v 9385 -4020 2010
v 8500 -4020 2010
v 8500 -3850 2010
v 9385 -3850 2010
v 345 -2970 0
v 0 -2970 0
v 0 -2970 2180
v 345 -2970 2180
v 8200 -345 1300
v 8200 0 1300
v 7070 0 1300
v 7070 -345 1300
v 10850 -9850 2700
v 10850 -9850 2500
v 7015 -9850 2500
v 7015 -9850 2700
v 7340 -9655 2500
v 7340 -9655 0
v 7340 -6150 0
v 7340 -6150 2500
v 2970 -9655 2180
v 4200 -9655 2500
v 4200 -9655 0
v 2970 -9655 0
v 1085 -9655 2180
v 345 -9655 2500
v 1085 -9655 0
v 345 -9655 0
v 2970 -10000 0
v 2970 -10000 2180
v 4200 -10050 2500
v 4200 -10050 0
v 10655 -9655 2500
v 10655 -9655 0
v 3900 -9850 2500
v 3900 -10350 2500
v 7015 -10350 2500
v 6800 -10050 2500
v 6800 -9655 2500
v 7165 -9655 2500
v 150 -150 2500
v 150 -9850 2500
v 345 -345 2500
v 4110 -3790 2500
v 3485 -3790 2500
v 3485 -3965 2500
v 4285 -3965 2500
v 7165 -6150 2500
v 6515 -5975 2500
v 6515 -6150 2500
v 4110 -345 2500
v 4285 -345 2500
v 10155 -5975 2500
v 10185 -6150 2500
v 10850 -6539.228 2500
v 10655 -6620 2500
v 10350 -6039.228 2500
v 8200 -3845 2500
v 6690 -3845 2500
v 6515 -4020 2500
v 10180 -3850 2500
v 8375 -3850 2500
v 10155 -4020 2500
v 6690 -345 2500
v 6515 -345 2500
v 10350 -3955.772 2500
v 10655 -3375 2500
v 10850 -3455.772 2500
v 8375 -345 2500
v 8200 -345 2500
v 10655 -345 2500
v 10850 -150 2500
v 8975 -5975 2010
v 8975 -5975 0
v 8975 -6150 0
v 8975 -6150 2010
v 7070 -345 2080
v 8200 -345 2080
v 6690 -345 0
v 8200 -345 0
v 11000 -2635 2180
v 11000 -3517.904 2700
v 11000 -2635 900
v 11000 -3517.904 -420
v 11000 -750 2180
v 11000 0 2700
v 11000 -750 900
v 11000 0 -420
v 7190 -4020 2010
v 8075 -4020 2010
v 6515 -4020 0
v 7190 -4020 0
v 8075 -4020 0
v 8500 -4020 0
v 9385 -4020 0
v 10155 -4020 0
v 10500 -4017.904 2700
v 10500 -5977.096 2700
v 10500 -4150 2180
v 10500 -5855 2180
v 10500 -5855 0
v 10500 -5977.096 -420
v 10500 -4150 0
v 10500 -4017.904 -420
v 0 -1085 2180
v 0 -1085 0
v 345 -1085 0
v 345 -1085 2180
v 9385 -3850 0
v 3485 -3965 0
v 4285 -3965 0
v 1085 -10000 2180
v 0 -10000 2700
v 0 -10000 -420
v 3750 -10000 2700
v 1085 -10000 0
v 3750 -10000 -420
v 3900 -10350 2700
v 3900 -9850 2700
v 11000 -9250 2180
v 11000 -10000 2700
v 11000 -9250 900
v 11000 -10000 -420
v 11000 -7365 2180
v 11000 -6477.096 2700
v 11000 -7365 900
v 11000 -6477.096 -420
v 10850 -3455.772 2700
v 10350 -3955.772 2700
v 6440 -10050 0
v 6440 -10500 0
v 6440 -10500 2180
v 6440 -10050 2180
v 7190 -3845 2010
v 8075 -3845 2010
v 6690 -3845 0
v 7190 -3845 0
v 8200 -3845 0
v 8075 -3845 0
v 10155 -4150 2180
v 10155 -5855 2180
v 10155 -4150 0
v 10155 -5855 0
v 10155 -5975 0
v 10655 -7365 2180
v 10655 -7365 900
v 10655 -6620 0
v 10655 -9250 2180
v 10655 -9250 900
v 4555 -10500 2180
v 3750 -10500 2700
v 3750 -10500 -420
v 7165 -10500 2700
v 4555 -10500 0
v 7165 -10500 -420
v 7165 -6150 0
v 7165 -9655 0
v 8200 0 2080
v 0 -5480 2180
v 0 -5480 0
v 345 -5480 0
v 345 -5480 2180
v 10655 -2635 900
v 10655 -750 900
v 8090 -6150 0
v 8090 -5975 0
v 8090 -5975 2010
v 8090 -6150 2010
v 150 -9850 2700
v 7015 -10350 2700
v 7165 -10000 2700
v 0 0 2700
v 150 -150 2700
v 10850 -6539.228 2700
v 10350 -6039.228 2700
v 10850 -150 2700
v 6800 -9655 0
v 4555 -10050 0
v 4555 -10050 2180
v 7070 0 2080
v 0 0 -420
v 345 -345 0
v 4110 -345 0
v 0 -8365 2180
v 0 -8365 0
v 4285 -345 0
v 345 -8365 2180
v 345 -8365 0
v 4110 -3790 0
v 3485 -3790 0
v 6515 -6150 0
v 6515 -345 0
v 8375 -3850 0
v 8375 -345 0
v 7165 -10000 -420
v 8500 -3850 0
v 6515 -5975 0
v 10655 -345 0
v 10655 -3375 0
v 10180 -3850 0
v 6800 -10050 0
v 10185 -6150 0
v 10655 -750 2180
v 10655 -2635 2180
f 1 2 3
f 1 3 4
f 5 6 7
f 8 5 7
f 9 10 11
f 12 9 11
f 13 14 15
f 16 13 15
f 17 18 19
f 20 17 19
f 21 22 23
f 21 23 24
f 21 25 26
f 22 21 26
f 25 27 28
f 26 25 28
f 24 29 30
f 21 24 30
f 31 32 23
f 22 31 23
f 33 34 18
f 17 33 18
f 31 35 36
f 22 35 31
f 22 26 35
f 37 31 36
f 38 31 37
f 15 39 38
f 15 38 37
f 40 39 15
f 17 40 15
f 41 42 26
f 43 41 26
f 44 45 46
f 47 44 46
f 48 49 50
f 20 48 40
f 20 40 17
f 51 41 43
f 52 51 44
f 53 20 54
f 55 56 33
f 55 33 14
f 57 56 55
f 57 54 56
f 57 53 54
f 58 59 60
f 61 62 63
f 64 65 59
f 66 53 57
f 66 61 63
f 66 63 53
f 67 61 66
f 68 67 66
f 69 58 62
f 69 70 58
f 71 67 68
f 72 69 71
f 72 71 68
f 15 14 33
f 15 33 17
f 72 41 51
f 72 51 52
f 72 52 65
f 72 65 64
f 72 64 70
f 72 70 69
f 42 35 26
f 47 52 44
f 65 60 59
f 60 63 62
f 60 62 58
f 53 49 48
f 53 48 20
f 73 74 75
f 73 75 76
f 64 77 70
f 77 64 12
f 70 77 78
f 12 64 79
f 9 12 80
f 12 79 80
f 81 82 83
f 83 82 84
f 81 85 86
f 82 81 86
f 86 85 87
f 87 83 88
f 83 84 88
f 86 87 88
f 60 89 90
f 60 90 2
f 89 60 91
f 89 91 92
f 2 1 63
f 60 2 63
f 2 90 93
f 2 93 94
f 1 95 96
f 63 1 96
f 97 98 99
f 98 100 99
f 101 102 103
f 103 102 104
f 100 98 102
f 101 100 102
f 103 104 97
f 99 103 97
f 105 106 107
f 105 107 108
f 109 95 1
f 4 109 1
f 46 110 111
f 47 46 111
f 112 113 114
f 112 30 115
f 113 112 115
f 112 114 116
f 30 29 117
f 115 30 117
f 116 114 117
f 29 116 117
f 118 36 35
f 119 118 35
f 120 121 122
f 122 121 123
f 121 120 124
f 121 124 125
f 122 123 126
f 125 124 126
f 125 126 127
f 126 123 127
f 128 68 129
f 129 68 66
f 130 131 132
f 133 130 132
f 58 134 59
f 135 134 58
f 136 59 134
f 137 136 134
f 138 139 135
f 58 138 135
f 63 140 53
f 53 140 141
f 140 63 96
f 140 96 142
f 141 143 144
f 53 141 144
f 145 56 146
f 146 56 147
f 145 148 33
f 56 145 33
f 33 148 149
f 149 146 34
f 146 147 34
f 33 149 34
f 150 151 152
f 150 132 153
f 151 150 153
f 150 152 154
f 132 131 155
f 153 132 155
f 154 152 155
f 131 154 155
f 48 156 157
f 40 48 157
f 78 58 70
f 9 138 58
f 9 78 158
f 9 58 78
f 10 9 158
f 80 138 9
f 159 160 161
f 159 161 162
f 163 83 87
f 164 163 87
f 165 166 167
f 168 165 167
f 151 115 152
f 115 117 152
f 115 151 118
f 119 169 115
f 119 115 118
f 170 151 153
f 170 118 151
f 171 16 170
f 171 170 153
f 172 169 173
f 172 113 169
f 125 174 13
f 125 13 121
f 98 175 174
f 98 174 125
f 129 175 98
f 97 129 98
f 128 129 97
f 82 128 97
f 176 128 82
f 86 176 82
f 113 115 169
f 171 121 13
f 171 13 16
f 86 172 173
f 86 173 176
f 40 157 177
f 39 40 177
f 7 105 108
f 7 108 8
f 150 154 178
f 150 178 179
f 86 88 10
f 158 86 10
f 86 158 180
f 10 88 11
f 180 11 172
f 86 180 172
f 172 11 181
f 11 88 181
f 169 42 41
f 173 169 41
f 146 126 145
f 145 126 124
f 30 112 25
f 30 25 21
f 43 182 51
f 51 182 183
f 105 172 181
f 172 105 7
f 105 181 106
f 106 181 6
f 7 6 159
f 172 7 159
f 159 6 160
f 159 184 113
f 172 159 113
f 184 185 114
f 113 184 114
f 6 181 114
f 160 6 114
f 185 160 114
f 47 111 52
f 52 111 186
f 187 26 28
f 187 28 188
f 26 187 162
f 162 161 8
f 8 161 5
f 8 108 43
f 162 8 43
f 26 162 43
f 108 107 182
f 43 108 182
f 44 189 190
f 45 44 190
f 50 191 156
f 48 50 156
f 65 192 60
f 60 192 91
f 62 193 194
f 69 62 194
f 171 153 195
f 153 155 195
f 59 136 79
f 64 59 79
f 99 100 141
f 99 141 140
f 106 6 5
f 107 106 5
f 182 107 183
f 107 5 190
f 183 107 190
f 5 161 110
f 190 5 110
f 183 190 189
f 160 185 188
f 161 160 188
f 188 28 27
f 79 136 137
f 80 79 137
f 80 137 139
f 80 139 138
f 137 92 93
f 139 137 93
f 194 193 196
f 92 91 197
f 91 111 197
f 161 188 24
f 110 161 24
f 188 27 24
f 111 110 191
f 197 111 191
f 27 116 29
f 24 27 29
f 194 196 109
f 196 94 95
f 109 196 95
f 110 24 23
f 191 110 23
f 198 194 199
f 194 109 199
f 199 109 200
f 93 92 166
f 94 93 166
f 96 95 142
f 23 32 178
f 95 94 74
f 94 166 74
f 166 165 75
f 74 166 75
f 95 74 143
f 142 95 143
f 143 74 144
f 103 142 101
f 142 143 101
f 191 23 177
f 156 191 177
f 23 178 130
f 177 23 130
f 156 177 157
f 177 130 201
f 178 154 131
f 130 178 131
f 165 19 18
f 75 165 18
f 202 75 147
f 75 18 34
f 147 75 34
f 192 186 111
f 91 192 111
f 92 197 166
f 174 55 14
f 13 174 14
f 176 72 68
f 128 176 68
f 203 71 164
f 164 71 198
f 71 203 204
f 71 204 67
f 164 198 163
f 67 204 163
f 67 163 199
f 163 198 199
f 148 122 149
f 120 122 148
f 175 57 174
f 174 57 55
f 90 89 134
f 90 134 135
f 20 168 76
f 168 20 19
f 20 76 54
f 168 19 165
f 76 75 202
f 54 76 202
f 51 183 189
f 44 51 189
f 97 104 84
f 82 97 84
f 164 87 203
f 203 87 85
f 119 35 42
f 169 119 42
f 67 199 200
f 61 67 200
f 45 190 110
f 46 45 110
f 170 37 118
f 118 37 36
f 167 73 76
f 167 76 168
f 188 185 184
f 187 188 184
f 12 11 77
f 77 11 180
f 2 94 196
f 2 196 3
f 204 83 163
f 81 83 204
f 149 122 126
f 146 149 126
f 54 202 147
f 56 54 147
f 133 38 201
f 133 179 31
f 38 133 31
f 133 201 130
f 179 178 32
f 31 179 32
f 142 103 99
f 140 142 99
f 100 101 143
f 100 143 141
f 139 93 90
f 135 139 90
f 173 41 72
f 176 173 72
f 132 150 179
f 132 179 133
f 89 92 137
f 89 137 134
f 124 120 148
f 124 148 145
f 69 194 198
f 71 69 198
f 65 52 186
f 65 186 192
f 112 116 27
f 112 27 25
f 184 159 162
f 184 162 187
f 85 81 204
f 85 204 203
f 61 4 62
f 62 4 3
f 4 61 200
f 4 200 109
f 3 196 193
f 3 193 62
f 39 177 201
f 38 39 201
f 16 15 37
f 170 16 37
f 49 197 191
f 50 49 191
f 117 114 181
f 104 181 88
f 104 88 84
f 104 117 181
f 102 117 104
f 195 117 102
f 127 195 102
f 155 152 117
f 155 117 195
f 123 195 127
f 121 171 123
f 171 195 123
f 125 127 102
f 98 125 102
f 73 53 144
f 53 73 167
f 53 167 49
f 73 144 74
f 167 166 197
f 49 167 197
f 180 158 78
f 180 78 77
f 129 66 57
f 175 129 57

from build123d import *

# Parameters (mm, degrees)
F0_W      = 1510
F0_H      = 3500
F1_DEPTH  = 2500
F3_DEPTH  = 420
F4_W      = 1705
F4_H      = 2180
F5_DEPTH  = 345
F6_W      = 885
F6_H      = 2010
F7_DEPTH  = 175
F8_W      = 885
F8_H      = 2010
F9_DEPTH  = 175
F10_W     = 1885
F10_H     = 2180
F10_W_2   = 2885
F11_DEPTH = 345
F12_W     = 1885
F12_H     = 2180
F13_DEPTH = 345
F14_W     = 1885
F14_H     = 2180
F15_DEPTH = 450
F16_W     = 1885
F16_H     = 1280
F17_DEPTH = 345
F18_W     = 1130
F18_H     = 780
F19_DEPTH = 345
F21_DEPTH = 200


with BuildPart() as f1:
    # F0 (on Top) → F1 (new body)
    with BuildSketch(Plane.XY):
        Polygon((0, 0), (0, -10000), (3750, -10000), (3750, -10500), (7165, -10500), (7165, -10000), (11000, -10000), (11000, -6477.096321), (10500, -5977.096321), (10500, -4017.903679), (11000, -3517.903679), (11000, 0), align=None)
        Polygon((10655, -6620), (10655, -9655), (7340, -9655), (7340, -6150), (10185, -6150), align=None, mode=Mode.SUBTRACT)
        Polygon((345, -9655), (345, -345), (4110, -345), (4110, -3790), (3485, -3790), (3485, -3965), (4285, -3965), (4285, -345), (6515, -345), (6515, -4020), (10155, -4020), (10155, -5975), (6515, -5975), (6515, -6150), (7165, -6150), (7165, -9655), (6800, -9655), (6800, -10050), (4200, -10050), (4200, -9655), align=None, mode=Mode.SUBTRACT)
        with Locations((7445, -2095)):
            Rectangle(F0_W, F0_H, mode=Mode.SUBTRACT)
        Polygon((10655, -3375), (10180, -3850), (8375, -3850), (8375, -345), (10655, -345), align=None, mode=Mode.SUBTRACT)
    extrude(amount=F1_DEPTH)

    # F2 (on face) → F3 (join)
    with BuildSketch(Plane(origin=(0, 0, 0), x_dir=(1, 0, 0), z_dir=(0, 0, -1))):
        Polygon((3750, 10000), (0, 10000), (0, 0), (11000, 0), (11000, 3517.903679), (10500, 4017.903679), (10500, 5977.096321), (11000, 6477.096321), (11000, 10000), (7165, 10000), (7165, 10500), (3750, 10500), align=None)
    extrude(amount=F3_DEPTH)

    # F4 (on face) → F5 (cut, through all)
    with BuildSketch(Plane.YZ.offset(10500)):
        with Locations((-5002.5, 1090)):
            Rectangle(F4_W, F4_H)
    extrude(amount=-F5_DEPTH, mode=Mode.SUBTRACT)

    # F6 (on face) → F7 (cut, through all)
    with BuildSketch(Plane.XZ.offset(4020)):
        with Locations((7632.5, 1005)):
            Rectangle(F6_W, F6_H)
        with Locations((8942.5, 1005)):
            Rectangle(F6_W, F6_H)
    extrude(amount=-F7_DEPTH, mode=Mode.SUBTRACT)

    # F8 (on face) → F9 (cut, through all)
    with BuildSketch(Plane(origin=(0, -5975, 0), x_dir=(-1, 0, 0), z_dir=(0, 1, 0))):
        with Locations((-8532.5, 1005)):
            Rectangle(F8_W, F8_H)
    extrude(amount=-F9_DEPTH, mode=Mode.SUBTRACT)

    # F10 (on face) → F11 (cut, through all)
    with BuildSketch(Plane(origin=(0, 0, 0), x_dir=(0, -1, 0), z_dir=(-1, 0, 0))):
        with Locations((2027.5, 1090)):
            Rectangle(F10_W, F10_H)
        with Locations((6922.5, 1090)):
            Rectangle(F10_W_2, F10_H)
    extrude(amount=-F11_DEPTH, mode=Mode.SUBTRACT)

    # F12 (on face) → F13 (cut, through all)
    with BuildSketch(Plane.XZ.offset(10000)):
        with Locations((2027.5, 1090)):
            Rectangle(F12_W, F12_H)
    extrude(amount=-F13_DEPTH, mode=Mode.SUBTRACT)

    # F14 (on face) → F15 (cut, through all)
    with BuildSketch(Plane.XZ.offset(10500)):
        with Locations((5497.5, 1090)):
            Rectangle(F14_W, F14_H)
    extrude(amount=-F15_DEPTH, mode=Mode.SUBTRACT)

    # F16 (on face) → F17 (cut, through all)
    with BuildSketch(Plane.YZ.offset(11000)):
        with Locations((-8307.5, 1540)):
            Rectangle(F16_W, F16_H)
        with Locations((-1692.5, 1540)):
            Rectangle(F16_W, F16_H)
    extrude(amount=-F17_DEPTH, mode=Mode.SUBTRACT)

    # F18 (on face) → F19 (cut, through all)
    with BuildSketch(Plane(origin=(0, 0, 0), x_dir=(-1, 0, 0), z_dir=(0, 1, 0))):
        with Locations((-7635, 1690)):
            Rectangle(F18_W, F18_H)
    extrude(amount=-F19_DEPTH, mode=Mode.SUBTRACT)

    # F20 (on face) → F21 (join)
    with BuildSketch(Plane.XY.offset(2500)):
        Polygon((0, 0), (0, -10000), (3750, -10000), (3750, -10500), (7165, -10500), (7165, -10000), (11000, -10000), (11000, -6477.096321), (10500, -5977.096321), (10500, -4017.903679), (11000, -3517.903679), (11000, 0), align=None)
        Polygon((3900, -9850), (150, -9850), (150, -150), (10850, -150), (10850, -3455.771645), (10350, -3955.771645), (10350, -6039.228355), (10850, -6539.228355), (10850, -9850), (7015, -9850), (7015, -10350), (3900, -10350), align=None, mode=Mode.SUBTRACT)
    extrude(amount=F21_DEPTH)


solid = f1.part
